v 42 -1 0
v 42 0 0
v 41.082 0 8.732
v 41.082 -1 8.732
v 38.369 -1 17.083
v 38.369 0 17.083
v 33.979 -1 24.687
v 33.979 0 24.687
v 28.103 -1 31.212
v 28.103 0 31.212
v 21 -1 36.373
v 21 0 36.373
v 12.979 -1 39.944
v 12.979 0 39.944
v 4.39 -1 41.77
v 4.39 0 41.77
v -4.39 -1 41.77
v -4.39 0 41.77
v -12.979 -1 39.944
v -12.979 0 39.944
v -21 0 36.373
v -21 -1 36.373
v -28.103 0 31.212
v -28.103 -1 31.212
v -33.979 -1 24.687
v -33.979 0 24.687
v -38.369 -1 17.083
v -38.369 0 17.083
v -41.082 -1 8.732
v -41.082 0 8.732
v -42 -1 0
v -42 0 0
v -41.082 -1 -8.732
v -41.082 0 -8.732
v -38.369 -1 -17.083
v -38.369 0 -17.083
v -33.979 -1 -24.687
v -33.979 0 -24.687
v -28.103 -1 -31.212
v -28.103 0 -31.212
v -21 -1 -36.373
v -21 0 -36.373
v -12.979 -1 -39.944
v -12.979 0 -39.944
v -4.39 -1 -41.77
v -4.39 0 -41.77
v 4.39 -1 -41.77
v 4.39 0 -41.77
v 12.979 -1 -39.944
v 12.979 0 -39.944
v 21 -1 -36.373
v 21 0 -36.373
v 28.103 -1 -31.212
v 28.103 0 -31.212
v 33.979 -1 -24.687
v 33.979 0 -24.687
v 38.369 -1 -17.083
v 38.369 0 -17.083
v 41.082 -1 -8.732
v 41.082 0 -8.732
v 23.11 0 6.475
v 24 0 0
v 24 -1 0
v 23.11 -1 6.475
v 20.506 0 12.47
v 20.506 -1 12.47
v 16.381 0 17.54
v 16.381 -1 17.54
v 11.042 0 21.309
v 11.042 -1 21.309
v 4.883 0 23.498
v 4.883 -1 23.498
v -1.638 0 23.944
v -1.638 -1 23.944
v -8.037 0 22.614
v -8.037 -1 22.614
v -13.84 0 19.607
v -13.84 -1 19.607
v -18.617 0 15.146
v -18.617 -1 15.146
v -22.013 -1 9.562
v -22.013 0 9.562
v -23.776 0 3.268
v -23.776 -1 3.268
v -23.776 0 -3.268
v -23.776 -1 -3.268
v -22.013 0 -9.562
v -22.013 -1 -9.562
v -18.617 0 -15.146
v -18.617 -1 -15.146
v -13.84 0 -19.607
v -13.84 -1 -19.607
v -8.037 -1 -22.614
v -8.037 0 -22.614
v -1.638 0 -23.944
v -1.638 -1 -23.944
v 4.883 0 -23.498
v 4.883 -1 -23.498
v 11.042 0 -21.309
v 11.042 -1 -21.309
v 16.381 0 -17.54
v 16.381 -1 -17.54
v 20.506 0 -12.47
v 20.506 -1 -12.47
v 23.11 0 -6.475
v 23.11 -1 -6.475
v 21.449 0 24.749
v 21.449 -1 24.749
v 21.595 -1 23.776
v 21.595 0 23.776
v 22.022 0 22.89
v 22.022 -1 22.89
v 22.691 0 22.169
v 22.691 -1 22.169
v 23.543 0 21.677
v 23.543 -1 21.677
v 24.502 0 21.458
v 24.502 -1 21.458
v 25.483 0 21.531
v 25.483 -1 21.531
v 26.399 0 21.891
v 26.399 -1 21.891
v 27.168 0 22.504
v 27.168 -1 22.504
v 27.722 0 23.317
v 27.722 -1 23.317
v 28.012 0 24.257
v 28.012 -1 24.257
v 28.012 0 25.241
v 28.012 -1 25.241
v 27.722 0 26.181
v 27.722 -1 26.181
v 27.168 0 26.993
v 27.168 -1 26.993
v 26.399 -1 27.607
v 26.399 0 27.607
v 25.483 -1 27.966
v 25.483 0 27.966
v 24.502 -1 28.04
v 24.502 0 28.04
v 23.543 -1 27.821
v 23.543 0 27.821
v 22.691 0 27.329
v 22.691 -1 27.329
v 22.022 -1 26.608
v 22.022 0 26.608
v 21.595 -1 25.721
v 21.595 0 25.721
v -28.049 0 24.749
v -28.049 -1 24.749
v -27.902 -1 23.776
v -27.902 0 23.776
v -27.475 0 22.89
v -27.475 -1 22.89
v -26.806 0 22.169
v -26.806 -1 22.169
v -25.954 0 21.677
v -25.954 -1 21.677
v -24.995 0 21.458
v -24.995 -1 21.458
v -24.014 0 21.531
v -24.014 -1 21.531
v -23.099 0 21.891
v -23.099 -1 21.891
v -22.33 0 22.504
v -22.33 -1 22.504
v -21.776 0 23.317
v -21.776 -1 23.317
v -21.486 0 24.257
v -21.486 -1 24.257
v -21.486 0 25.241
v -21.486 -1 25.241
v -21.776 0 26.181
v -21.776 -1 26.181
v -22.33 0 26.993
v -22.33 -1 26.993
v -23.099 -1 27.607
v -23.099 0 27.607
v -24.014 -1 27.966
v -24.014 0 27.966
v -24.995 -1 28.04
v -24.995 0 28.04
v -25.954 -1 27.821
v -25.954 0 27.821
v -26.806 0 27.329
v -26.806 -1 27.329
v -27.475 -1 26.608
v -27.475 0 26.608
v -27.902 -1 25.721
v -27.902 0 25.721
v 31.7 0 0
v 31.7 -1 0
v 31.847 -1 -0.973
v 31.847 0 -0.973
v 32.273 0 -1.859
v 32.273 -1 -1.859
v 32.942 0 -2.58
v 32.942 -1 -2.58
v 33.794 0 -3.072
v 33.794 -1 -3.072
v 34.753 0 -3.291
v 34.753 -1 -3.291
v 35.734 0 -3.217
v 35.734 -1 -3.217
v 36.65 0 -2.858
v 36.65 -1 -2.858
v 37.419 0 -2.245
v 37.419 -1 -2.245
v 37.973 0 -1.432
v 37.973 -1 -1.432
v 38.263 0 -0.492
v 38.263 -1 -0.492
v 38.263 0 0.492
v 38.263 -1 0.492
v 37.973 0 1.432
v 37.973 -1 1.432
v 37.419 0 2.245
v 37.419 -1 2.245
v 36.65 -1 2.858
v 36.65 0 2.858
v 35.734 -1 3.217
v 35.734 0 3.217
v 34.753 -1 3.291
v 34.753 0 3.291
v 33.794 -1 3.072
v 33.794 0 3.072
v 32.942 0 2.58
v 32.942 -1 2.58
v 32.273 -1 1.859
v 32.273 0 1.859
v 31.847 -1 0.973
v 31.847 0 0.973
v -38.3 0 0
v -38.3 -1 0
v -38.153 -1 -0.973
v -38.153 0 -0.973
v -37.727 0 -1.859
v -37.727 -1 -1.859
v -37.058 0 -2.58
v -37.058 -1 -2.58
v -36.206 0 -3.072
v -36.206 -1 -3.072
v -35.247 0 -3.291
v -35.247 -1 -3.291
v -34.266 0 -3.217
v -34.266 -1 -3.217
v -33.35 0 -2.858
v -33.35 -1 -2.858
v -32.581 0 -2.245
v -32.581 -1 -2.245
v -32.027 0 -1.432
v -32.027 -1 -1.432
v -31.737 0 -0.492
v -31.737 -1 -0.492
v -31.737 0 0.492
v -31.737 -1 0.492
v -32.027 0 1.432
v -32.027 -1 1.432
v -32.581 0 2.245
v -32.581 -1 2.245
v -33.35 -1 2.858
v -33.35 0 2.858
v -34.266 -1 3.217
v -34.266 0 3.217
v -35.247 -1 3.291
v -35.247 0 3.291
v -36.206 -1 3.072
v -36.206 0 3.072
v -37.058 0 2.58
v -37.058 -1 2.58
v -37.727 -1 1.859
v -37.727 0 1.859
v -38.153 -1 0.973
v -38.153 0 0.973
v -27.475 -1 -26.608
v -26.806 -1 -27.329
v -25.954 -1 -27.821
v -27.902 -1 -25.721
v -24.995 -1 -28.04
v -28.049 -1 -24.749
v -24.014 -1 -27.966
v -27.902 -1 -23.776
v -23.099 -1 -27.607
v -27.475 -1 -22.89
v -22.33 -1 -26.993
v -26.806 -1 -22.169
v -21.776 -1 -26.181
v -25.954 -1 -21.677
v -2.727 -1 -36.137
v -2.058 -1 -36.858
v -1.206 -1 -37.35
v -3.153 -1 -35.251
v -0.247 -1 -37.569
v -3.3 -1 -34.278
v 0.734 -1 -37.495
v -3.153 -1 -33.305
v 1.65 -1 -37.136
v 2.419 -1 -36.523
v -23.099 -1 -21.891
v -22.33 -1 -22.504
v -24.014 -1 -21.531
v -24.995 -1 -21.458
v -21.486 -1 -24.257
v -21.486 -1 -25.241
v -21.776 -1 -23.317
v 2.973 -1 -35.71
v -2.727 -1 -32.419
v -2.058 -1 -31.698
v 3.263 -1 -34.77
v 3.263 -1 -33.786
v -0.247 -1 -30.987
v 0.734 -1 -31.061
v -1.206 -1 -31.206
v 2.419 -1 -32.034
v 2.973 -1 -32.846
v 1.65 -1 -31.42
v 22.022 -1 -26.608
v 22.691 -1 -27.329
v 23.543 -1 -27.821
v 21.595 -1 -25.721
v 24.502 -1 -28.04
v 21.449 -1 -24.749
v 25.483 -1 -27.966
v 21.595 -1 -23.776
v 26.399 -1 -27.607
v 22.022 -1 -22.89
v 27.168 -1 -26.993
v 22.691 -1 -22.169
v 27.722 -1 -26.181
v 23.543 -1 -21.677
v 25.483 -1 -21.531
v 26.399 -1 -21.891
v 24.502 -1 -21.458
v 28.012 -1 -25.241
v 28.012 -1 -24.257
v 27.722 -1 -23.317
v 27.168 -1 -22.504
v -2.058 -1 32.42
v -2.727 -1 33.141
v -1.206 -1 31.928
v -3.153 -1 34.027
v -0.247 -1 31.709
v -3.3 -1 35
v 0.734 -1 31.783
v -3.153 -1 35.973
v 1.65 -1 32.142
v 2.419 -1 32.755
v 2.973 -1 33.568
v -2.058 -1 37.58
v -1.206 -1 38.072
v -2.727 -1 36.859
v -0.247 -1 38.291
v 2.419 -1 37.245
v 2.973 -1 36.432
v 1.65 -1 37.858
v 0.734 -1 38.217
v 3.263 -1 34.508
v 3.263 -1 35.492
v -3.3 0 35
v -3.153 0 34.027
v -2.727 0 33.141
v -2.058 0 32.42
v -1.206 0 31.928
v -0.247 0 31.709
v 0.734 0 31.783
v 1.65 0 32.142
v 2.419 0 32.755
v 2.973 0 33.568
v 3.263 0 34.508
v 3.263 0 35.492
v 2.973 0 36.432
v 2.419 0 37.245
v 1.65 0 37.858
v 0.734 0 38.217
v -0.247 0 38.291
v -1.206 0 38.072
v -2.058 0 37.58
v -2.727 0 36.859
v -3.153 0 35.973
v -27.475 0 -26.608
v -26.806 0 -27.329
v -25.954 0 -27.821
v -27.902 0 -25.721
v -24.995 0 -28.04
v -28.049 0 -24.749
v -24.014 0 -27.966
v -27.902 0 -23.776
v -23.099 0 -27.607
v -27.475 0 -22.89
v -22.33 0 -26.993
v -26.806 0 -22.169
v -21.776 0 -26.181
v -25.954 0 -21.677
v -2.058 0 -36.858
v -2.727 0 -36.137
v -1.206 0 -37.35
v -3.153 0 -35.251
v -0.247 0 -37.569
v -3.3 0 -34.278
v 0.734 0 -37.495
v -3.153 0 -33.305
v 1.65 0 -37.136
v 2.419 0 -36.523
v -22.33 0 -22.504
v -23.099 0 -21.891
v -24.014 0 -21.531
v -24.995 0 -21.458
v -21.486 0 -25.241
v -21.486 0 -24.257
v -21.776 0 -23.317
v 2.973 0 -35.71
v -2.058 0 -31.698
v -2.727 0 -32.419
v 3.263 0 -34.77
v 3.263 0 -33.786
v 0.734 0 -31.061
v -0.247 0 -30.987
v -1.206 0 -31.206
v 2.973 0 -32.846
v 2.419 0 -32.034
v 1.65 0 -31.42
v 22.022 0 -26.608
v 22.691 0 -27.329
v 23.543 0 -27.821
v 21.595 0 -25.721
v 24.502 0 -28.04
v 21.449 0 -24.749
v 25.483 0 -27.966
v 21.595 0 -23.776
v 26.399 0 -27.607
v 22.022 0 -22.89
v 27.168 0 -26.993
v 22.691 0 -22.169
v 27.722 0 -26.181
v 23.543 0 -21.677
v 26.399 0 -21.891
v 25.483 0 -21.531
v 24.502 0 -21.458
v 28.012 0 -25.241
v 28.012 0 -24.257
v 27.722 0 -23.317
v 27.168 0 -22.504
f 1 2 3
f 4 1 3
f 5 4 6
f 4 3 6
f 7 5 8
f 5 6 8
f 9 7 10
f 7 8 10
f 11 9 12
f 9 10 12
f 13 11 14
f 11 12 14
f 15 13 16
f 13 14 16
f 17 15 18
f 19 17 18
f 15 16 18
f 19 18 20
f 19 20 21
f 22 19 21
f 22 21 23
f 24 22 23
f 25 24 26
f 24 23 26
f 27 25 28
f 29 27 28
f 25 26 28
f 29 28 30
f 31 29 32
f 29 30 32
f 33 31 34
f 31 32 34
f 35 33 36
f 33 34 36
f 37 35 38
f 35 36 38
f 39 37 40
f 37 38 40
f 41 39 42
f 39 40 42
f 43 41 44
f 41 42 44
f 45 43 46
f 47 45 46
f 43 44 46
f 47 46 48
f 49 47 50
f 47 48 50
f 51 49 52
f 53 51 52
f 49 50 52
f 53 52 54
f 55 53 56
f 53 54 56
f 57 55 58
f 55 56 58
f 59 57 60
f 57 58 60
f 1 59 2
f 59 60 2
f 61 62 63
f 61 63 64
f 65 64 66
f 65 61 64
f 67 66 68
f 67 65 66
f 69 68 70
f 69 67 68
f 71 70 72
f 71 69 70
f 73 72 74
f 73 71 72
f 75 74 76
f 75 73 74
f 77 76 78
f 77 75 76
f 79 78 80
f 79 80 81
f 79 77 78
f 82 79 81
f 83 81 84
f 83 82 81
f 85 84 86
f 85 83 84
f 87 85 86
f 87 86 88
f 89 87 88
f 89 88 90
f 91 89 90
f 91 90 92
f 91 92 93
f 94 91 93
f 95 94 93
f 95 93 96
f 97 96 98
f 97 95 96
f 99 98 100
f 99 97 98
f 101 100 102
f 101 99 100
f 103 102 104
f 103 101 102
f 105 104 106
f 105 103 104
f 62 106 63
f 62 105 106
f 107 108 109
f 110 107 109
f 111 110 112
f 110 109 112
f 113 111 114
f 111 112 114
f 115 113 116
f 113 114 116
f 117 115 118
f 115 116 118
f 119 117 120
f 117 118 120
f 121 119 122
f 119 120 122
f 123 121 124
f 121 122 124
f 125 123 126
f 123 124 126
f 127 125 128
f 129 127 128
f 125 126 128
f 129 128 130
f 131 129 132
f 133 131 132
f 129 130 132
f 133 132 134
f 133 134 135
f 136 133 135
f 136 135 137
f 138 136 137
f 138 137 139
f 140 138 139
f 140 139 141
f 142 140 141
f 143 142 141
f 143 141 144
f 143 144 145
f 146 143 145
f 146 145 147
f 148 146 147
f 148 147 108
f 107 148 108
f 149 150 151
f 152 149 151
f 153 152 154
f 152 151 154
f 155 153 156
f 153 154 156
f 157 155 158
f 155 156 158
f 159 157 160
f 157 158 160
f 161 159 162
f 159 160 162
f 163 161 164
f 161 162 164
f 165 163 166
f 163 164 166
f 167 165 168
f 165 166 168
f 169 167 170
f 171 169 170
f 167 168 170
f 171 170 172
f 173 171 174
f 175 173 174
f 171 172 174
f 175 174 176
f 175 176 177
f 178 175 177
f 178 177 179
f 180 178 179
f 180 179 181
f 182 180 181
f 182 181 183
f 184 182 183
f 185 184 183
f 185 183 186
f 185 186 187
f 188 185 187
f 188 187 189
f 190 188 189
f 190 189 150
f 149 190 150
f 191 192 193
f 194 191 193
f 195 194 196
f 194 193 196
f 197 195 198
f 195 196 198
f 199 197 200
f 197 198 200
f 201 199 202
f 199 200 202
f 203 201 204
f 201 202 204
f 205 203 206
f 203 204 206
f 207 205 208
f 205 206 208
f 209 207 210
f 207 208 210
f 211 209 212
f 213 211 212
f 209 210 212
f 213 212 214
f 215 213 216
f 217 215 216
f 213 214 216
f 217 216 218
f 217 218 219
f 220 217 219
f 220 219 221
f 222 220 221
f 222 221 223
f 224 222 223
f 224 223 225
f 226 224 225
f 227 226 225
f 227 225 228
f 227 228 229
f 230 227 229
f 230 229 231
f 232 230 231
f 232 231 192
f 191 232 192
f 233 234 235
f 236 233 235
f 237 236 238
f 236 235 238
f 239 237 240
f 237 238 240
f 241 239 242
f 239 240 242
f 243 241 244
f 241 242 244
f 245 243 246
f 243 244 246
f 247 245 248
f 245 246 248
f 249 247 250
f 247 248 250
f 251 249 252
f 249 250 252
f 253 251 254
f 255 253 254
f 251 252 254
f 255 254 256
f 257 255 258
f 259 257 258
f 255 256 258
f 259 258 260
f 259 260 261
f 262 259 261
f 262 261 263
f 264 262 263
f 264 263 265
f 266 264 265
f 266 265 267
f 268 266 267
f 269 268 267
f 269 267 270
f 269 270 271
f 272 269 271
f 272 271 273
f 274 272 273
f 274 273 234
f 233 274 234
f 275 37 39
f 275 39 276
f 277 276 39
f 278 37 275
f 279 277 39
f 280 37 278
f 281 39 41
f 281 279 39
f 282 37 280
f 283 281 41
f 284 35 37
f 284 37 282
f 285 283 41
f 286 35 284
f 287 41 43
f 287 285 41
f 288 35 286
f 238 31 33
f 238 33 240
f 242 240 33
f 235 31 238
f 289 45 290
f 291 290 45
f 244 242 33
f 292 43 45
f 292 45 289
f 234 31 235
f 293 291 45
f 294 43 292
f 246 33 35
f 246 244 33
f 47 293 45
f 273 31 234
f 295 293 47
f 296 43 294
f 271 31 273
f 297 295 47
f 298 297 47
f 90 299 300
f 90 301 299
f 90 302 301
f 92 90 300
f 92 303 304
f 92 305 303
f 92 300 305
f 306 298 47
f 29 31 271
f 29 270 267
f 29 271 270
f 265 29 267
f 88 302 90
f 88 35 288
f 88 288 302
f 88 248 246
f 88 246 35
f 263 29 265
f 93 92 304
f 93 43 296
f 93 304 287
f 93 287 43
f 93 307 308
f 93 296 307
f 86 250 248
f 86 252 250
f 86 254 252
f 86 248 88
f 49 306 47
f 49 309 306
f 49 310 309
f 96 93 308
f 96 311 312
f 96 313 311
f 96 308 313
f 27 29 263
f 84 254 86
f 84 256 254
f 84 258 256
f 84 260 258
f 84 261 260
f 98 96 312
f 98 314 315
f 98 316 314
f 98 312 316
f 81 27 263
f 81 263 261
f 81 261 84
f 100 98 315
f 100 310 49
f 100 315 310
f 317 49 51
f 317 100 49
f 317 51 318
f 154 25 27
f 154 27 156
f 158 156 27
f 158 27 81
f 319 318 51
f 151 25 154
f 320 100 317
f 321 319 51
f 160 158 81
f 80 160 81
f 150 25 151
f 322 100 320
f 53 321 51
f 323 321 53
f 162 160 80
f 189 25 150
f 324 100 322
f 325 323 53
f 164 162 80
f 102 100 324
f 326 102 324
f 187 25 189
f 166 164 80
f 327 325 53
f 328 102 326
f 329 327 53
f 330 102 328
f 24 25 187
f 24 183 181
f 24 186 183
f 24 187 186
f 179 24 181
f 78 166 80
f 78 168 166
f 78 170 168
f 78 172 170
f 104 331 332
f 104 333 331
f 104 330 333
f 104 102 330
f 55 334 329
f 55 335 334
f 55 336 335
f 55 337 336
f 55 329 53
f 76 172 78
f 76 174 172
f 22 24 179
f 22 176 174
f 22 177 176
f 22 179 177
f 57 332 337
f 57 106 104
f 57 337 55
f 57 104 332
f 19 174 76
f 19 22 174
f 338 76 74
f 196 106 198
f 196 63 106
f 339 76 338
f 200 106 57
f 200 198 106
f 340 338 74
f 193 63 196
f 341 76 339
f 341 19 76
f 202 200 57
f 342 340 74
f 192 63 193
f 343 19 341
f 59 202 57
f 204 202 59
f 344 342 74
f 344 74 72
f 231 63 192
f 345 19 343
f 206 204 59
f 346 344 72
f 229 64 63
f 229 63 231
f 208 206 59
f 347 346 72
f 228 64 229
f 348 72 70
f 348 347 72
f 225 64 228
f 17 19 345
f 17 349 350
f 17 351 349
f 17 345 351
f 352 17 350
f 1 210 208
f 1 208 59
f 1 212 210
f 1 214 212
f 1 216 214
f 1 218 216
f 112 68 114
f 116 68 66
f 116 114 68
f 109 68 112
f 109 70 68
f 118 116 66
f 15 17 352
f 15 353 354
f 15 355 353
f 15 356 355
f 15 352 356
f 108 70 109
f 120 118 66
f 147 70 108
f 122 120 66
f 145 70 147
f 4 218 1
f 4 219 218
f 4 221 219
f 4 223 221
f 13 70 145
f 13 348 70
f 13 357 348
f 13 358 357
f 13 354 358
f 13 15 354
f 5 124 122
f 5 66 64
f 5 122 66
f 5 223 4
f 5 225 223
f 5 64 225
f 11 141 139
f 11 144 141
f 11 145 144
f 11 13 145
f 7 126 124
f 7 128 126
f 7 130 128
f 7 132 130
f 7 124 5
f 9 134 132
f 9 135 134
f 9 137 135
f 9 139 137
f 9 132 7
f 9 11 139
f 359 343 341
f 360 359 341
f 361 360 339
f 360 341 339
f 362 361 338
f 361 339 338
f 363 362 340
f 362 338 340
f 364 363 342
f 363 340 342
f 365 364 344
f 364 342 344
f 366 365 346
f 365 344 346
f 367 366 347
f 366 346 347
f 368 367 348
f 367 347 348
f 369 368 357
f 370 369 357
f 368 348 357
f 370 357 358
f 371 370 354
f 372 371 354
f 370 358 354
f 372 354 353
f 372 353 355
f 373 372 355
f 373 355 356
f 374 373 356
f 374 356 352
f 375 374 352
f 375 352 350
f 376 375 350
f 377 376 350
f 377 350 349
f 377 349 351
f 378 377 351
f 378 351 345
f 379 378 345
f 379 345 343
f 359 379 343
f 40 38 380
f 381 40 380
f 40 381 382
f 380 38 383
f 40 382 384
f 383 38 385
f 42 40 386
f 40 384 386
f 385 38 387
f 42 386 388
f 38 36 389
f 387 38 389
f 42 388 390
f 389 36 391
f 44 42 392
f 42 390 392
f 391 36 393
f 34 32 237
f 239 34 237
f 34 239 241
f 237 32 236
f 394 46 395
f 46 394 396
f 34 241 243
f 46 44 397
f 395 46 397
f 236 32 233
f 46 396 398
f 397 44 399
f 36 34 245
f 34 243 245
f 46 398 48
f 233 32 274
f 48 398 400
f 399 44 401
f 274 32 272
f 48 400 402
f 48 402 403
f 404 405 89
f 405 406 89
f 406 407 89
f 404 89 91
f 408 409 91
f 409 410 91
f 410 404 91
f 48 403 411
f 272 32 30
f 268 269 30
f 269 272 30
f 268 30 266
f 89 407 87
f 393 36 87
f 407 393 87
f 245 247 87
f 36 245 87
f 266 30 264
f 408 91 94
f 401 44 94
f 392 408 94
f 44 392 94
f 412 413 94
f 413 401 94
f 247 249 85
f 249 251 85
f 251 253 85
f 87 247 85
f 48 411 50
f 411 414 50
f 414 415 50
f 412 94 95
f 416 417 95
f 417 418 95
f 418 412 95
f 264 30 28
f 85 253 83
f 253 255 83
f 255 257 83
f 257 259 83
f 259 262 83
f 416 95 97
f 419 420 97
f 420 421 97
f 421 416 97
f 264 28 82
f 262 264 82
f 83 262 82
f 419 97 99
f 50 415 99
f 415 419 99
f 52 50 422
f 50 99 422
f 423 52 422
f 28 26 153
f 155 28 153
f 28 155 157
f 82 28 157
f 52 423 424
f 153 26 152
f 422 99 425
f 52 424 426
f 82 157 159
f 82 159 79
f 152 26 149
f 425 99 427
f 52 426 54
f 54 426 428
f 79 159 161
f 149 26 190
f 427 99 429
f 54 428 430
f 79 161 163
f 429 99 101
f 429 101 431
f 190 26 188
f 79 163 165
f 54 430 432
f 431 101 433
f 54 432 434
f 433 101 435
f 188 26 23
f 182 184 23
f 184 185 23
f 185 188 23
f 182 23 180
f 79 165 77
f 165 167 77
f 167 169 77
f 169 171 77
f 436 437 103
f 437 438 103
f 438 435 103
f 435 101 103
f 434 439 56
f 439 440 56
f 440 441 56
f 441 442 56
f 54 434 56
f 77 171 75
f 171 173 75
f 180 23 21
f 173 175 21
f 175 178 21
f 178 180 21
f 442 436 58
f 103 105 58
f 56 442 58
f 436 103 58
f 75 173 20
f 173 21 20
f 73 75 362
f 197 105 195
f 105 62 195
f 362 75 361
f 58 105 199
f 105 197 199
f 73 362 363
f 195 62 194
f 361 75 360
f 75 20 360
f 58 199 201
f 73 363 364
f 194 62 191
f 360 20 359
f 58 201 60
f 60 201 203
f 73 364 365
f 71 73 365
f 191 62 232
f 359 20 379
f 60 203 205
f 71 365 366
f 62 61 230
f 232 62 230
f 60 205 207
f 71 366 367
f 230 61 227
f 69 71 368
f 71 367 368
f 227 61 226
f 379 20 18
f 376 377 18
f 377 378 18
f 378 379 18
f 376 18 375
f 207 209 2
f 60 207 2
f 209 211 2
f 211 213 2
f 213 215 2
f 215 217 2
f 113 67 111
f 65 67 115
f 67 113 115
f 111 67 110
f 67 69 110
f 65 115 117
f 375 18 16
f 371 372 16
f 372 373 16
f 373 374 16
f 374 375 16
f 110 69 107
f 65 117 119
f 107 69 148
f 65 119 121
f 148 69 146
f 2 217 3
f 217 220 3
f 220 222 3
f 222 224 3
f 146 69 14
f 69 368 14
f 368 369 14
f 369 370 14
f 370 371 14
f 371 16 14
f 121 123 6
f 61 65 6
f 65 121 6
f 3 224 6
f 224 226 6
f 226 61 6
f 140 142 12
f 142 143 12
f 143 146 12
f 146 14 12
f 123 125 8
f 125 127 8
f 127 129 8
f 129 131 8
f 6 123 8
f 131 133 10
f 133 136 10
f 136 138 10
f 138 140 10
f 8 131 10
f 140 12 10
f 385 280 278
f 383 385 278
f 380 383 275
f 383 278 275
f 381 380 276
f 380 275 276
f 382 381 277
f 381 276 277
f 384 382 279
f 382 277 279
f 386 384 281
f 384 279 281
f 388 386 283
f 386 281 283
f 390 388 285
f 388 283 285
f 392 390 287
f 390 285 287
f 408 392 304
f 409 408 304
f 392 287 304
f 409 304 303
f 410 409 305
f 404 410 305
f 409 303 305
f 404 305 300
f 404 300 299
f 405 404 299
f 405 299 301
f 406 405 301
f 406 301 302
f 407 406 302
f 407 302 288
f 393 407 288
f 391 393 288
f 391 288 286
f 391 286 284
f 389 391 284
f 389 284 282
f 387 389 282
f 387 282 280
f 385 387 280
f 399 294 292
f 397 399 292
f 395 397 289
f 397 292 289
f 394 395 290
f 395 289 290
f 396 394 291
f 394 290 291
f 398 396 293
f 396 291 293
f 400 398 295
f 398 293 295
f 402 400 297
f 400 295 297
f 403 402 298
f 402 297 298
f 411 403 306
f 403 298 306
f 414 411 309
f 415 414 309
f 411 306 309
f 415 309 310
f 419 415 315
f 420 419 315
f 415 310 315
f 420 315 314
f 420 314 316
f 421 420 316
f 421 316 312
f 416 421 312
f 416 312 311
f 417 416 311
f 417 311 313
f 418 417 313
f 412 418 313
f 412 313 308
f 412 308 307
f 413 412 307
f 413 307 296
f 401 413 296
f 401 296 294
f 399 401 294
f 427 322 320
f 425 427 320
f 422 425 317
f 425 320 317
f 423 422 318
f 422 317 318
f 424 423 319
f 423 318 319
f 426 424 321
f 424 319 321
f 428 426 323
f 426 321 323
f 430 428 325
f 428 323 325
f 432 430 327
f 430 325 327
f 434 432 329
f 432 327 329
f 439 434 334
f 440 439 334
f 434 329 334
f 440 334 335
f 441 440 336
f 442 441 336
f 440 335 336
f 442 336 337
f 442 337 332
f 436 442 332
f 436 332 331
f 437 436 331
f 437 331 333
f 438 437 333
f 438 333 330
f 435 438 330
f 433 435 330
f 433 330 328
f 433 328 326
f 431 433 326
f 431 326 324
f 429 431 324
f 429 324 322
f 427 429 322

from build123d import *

# Parameters (mm, degrees)
F0_R     = 42
F0_R_2   = 3.3
F0_R_3   = 24
F1_DEPTH = 1
F2_D     = 6.6


with BuildPart() as f1:
    # F0 (on Front) → F1 (new body)
    with BuildSketch(Plane.XZ):
        Circle(F0_R)
        with Locations((-24.7487373415, -24.7487373415)):
            Circle(F0_R_2, mode=Mode.SUBTRACT)
        with Locations((0, -34.2780984938)):
            Circle(F0_R_2, mode=Mode.SUBTRACT)
        with Locations((24.7487373415, -24.7487373415)):
            Circle(F0_R_2, mode=Mode.SUBTRACT)
        with Locations((-35, 0)):
            Circle(F0_R_2, mode=Mode.SUBTRACT)
        with Locations((-24.7487373415, 24.7487373415)):
            Circle(F0_R_2, mode=Mode.SUBTRACT)
        Circle(F0_R_3, mode=Mode.SUBTRACT)
        with Locations((35, 0)):
            Circle(F0_R_2, mode=Mode.SUBTRACT)
        with Locations((0, 35)):
            Circle(F0_R_2, mode=Mode.SUBTRACT)
        with Locations((24.7487373415, 24.7487373415)):
            Circle(F0_R_2, mode=Mode.SUBTRACT)
        with Locations((0, 35)):
            Circle(F0_R_2)
        with Locations((-24.7487373415, 24.7487373415)):
            Circle(F0_R_2)
        with Locations((-24.7487373415, -24.7487373415)):
            Circle(F0_R_2)
        with Locations((-35, 0)):
            Circle(F0_R_2)
        with Locations((0, -34.2780984938)):
            Circle(F0_R_2)
        with Locations((24.7487373415, -24.7487373415)):
            Circle(F0_R_2)
        with Locations((35, 0)):
            Circle(F0_R_2)
        with Locations((24.7487373415, 24.7487373415)):
            Circle(F0_R_2)
    extrude(amount=F1_DEPTH)

    # F2 (through all)
    with Locations(Plane(origin=(0, 0, 0), x_dir=(1, 0, 0), z_dir=(0, 1, 0))):
        with Locations((24.7487373415, -24.7487373415), (35, 0), (24.7487373415, 24.7487373415), (0, 34.2780984938), (-24.7487373415, 24.7487373415), (-35, 0), (-24.7487373415, -24.7487373415), (0, -35)):
            Hole(F2_D / 2)


solid = f1.part
